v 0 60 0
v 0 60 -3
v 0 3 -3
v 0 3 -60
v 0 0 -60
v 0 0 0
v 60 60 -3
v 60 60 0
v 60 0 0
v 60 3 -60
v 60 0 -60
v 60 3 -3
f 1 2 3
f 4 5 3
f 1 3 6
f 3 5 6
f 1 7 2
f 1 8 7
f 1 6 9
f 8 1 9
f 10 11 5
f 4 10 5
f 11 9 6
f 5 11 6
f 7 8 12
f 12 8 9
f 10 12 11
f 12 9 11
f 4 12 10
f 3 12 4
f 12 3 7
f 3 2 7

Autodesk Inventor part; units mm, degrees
ref_plane "YZ Plane" through (0, 0, 0) normal (1, 0, 0) x (0, 1, 0)
ref_plane "XZ Plane" through (0, 0, 0) normal (0, 1, 0) x (-1, 0, 0)
ref_plane "XY Plane" through (0, 0, 0) normal (0, 0, 1) x (1, 0, 0)
sketch "Sketch1" plane through (0, 0, 0) normal (0, 1, 0) x (-1, 0, 0)
  line L0 (0, 0) -> (-60, 0)
  line L1 (-60, 0) -> (-60, -60)
  line L2 (-60, -60) -> (0, -60)
  line L3 (0, -60) -> (0, 0)
  dimension "d0" = 60
  dimension "d1" = 60
extrude "Extrusion1" add sketch "Sketch1" along normal blind 3
sketch "Sketch2" plane through (0, 0, 0) normal (0, 0, 1) x (1, 0, 0)
  line L0 (60, 0) -> (0, 0) projected
  line L1 (0, 0) -> (60, 0)
  line L2 (60, 0) -> (60, 60)
  line L3 (60, 60) -> (0, 60)
  line L4 (0, 60) -> (0, 0)
  line L5 (0, 0) -> (60, 0) projected
  line L6 (0, 0) -> (60, 0) projected
  line L7 (60, 0) -> (60, 3) projected
  line L8 (0, 3) -> (60, 3) projected
  line L9 (0, 0) -> (0, 3) projected
  dimension "d4" = 60
  dimension "d5" = 60
extrude "Extrusion2" add sketch "Sketch2" against normal blind 3 contours L8 L4 L3 L2
properties part number "T4788-SWERVE-004-BRACKET"
